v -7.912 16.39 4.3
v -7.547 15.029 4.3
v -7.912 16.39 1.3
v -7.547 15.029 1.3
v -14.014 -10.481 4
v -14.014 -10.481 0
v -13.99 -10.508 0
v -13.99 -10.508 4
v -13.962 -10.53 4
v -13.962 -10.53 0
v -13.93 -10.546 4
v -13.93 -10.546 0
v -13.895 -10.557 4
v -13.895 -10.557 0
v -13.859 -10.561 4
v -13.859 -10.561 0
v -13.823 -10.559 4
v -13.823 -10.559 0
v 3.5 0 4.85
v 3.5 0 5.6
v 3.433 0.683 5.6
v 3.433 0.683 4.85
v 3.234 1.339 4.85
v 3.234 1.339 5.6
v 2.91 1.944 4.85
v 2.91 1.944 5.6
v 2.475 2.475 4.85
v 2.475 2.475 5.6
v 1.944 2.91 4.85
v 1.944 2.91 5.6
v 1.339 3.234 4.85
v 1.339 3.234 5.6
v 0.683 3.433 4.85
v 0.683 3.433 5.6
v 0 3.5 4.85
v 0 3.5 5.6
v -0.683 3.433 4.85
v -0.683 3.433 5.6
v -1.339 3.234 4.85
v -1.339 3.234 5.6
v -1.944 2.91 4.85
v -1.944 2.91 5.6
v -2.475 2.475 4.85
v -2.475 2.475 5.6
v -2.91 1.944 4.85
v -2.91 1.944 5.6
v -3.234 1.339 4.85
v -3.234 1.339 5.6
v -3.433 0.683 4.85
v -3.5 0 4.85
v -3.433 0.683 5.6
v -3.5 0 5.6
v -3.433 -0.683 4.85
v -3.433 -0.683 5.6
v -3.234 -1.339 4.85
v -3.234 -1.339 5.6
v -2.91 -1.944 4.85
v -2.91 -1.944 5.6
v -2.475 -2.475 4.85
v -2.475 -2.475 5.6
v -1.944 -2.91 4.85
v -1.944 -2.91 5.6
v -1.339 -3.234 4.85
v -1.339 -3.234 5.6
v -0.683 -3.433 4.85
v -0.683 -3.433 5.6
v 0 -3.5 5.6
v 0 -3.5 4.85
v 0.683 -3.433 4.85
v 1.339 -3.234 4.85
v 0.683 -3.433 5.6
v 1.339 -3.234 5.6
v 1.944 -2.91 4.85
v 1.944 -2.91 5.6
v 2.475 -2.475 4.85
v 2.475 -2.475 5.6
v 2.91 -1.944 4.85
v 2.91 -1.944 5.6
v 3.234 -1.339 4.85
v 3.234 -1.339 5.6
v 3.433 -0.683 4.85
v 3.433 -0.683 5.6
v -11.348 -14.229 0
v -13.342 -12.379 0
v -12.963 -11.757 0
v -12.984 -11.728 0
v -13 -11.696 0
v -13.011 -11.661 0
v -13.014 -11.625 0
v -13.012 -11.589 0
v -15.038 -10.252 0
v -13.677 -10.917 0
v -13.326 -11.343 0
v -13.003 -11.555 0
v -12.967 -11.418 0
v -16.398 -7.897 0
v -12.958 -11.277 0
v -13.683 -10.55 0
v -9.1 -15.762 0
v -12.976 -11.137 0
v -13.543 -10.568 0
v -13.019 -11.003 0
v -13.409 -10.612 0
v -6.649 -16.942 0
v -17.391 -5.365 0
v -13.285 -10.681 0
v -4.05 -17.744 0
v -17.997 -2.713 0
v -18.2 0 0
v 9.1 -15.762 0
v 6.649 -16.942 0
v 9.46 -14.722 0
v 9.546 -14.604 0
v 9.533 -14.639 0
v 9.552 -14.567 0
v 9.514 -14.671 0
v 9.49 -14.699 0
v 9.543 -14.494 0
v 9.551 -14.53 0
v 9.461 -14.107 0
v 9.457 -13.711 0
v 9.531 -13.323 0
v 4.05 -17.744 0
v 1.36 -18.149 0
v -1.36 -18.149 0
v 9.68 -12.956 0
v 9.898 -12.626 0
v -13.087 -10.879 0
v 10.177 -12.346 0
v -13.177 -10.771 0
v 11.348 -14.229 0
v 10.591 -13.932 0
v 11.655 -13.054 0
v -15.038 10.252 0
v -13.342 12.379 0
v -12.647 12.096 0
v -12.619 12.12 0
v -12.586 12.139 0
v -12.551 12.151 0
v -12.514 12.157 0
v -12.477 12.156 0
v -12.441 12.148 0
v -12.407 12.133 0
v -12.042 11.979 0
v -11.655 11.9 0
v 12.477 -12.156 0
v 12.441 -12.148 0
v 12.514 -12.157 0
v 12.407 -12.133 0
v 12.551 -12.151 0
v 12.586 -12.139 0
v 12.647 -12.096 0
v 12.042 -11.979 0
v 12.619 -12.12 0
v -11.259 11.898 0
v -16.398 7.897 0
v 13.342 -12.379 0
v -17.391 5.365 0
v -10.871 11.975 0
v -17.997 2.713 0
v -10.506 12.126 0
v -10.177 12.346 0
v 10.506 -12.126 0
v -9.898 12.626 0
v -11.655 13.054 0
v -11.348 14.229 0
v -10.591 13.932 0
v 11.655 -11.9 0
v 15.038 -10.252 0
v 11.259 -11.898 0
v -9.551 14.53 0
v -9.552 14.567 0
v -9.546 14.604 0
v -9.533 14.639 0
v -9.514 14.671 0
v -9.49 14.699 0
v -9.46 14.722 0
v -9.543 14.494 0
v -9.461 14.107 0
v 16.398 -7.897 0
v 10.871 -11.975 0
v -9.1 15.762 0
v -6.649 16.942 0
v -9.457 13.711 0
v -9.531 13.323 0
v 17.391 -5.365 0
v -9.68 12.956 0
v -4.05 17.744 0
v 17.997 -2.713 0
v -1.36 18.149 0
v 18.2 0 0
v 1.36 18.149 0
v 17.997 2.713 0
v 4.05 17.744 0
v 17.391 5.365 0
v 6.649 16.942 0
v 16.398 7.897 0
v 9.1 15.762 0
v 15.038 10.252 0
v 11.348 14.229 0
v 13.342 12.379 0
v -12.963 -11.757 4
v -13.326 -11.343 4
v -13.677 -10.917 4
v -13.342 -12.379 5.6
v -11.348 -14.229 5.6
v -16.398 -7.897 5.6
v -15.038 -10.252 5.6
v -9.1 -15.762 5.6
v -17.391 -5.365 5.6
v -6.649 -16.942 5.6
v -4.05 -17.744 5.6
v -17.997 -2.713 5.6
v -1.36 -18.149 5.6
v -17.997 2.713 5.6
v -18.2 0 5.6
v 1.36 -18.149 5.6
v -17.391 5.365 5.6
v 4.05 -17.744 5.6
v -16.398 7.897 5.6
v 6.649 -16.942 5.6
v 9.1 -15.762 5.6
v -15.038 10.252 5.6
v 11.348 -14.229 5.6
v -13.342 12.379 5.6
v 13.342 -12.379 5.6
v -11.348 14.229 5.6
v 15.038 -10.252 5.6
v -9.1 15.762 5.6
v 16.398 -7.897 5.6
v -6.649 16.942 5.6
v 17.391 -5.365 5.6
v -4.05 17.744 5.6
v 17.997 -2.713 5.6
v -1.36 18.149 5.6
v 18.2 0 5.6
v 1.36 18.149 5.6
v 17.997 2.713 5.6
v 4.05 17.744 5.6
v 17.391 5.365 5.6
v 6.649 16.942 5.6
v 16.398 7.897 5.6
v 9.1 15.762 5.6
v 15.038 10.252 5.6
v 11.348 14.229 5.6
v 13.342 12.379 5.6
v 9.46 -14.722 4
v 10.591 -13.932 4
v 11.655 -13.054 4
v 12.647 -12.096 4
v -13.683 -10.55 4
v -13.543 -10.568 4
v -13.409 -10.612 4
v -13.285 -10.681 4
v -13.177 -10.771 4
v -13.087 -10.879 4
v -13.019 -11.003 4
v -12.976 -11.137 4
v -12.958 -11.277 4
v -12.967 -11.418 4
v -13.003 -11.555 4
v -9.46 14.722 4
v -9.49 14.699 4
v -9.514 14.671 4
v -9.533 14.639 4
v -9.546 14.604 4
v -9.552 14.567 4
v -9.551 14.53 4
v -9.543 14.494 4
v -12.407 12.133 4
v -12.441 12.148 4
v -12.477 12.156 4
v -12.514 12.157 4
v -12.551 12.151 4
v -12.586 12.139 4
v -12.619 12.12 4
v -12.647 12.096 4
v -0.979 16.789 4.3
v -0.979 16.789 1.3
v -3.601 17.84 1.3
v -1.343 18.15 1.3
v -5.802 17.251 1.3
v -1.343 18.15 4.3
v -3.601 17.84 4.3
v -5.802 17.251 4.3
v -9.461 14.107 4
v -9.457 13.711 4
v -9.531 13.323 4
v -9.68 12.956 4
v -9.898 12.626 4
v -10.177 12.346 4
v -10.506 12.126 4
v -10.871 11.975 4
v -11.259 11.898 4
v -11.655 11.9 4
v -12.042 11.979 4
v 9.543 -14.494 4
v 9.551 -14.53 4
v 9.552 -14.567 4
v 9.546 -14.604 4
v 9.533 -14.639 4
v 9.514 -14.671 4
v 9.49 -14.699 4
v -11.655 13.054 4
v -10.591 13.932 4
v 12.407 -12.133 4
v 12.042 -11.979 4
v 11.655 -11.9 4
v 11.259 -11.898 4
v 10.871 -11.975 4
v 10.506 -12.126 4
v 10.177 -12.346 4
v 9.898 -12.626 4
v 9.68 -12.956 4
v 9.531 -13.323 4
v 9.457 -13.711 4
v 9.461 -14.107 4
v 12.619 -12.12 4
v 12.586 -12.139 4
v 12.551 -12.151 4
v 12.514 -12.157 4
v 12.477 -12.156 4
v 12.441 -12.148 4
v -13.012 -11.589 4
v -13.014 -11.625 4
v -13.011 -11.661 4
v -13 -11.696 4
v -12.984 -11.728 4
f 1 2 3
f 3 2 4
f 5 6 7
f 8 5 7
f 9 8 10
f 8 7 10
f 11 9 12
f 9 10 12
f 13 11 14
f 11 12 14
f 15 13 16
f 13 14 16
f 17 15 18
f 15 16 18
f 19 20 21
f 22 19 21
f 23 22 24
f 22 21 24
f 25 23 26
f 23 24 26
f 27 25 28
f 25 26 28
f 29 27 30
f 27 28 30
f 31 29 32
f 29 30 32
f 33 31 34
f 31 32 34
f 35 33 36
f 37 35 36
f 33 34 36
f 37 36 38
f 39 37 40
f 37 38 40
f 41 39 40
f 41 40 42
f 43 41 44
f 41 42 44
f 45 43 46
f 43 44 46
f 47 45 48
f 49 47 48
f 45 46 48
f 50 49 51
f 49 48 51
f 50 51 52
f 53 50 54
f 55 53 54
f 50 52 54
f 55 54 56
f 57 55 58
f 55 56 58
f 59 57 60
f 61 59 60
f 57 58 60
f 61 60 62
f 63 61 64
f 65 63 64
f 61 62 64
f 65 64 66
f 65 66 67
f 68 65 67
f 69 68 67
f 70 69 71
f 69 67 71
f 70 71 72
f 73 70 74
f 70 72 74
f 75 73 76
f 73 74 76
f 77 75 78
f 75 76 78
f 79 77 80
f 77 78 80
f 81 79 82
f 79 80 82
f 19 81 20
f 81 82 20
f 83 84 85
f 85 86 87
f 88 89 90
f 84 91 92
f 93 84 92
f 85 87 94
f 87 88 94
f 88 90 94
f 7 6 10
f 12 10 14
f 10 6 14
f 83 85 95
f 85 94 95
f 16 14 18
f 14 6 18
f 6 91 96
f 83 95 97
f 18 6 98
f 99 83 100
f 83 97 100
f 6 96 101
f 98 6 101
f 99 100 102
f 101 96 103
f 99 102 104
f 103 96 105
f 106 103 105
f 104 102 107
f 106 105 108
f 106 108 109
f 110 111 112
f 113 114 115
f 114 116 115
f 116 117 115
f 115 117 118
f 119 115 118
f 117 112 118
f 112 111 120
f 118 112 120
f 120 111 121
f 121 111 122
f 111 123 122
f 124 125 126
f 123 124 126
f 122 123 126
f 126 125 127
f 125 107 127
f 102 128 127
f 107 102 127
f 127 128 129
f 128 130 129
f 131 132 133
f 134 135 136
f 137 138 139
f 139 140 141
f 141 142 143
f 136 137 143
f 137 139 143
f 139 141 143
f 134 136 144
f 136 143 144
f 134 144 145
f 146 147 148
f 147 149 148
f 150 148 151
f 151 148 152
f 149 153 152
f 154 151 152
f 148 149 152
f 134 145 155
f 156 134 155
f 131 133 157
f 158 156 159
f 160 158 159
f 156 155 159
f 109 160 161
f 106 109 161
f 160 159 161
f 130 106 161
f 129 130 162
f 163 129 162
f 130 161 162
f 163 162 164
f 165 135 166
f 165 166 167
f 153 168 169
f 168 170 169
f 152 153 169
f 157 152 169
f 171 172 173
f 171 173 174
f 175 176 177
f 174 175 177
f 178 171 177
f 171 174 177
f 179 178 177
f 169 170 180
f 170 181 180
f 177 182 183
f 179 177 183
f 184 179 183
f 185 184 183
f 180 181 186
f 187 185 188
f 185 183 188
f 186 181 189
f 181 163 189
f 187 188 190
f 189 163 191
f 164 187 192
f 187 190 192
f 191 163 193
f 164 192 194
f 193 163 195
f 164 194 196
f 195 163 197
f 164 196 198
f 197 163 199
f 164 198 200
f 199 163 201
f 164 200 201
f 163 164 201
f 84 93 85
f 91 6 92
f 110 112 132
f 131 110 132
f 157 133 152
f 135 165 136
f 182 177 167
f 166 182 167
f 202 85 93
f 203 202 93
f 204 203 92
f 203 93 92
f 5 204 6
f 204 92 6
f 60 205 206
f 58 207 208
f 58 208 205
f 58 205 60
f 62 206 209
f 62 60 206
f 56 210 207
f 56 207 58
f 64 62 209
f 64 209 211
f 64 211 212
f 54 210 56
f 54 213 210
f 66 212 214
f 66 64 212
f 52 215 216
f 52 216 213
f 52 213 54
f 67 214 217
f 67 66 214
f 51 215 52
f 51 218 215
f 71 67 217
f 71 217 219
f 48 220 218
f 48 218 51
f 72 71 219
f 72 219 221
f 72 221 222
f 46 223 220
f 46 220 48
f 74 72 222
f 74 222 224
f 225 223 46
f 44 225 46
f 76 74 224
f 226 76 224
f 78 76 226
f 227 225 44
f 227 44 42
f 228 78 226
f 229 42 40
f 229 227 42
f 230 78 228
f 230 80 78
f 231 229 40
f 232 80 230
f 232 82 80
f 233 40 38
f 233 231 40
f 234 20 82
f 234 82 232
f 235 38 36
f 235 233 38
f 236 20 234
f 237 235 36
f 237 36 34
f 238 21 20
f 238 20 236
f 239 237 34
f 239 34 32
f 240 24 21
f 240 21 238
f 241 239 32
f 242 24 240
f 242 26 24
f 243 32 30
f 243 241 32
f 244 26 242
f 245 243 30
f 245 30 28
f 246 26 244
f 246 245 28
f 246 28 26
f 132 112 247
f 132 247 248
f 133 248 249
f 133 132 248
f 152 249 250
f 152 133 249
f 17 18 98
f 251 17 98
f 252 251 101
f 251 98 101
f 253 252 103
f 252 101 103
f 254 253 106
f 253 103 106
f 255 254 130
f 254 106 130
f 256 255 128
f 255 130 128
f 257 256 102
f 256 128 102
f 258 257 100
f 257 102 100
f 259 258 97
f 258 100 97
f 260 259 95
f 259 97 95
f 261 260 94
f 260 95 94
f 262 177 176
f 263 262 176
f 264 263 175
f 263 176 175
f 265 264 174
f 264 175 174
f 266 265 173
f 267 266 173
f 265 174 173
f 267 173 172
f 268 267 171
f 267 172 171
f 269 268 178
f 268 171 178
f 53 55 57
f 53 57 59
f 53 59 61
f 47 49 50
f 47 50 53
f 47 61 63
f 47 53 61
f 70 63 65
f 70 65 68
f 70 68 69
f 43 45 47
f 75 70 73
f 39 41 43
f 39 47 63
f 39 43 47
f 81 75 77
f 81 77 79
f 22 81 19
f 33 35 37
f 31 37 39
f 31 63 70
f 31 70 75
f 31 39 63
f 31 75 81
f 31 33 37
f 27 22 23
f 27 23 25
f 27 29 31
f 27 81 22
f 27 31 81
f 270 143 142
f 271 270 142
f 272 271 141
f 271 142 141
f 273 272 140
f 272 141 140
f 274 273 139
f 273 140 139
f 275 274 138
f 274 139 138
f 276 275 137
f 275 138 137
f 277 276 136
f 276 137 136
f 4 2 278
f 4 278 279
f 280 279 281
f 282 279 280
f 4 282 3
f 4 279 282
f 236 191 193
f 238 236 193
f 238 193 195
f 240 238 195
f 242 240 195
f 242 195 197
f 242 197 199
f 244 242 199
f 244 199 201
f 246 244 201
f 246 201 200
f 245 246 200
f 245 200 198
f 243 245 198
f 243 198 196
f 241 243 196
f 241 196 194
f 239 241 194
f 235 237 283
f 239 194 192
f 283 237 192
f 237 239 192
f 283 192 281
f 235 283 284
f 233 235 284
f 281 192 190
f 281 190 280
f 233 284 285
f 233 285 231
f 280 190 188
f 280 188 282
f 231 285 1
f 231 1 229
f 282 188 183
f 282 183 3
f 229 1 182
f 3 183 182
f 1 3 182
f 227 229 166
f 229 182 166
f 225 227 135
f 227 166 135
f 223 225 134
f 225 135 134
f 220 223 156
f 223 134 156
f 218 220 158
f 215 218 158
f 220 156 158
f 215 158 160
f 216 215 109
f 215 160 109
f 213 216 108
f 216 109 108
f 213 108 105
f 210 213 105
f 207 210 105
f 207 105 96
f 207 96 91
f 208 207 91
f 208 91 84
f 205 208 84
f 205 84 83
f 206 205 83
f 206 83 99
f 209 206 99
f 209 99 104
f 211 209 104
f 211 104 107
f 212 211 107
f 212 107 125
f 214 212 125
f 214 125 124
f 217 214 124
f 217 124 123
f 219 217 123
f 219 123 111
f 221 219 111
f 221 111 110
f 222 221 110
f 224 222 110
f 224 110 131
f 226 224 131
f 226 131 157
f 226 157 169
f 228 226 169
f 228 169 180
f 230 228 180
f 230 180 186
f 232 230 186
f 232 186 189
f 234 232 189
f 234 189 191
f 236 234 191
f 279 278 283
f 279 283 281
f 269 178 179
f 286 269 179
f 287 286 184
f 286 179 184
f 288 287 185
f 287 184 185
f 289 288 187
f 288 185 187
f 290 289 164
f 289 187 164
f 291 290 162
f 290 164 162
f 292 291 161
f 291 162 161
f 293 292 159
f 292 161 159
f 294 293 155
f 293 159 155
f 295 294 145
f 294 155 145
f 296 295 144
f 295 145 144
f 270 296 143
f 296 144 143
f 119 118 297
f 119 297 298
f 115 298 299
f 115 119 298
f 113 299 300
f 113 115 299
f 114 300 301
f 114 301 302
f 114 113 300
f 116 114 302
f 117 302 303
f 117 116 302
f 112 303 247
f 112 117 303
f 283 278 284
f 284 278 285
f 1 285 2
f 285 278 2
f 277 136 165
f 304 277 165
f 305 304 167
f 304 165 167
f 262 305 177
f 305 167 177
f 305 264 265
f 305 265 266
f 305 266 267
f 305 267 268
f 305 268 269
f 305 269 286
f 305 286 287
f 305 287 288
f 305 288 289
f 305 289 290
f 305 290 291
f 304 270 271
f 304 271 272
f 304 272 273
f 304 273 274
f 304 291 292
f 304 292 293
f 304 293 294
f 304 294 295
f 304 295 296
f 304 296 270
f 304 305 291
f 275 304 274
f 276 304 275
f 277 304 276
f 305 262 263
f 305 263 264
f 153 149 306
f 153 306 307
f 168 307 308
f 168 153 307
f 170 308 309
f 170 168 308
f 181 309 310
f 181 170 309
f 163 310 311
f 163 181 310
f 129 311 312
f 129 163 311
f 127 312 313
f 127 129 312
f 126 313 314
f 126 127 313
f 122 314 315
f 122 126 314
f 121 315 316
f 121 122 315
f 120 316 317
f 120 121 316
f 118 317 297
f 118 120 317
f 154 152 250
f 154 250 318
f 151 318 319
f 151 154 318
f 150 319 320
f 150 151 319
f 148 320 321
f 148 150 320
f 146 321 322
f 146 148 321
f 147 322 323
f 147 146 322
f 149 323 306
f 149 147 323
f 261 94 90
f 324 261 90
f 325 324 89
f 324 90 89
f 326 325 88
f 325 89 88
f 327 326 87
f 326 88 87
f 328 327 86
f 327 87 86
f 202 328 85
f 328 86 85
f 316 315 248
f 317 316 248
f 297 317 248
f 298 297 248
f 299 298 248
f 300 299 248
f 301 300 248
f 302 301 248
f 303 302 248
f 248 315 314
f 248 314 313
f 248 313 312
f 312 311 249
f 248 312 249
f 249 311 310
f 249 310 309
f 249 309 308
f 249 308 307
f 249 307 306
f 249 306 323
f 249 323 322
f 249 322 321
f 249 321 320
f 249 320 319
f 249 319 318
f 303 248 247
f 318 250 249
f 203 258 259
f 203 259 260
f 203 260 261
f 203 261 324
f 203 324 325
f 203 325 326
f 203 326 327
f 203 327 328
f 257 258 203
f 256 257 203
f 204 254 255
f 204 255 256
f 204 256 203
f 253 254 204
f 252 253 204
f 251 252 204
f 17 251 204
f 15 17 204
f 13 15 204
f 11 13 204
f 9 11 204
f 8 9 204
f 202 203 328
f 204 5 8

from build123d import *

# Parameters (mm, degrees)
SKETCH1_R               = 18.2
BOSS_EXTRUDE1_DEPTH     = 5.6
CUT_EXTRUDE1_DEPTH      = 4
SKETCH3_R               = 3.5
CUT_EXTRUDE2_DEPTH      = 0.75
CUT_EXTRUDE3_REACH      = 44.811
CUT_EXTRUDE3_END_RADIUS = 18.2
CUT_EXTRUDE3_START      = 16.47
SKETCH5_W               = 3
SKETCH5_H               = 6.8


with BuildPart() as part:
    # Sketch1 → Boss-Extrude1 (new body)
    with BuildSketch(Plane.XY):
        Circle(SKETCH1_R)
    extrude(amount=BOSS_EXTRUDE1_DEPTH)

    # Sketch2 → Cut-Extrude1 (cut)
    with BuildSketch(Plane(origin=(0, 0, 0), x_dir=(-1, 0, 0), z_dir=(0, 0, -1))):
        with BuildLine():
            ThreePointArc((12.962542311, -11.756806404), (13.503430209, -11.131368855), (14.014170433, -10.481079481))
            ThreePointArc((14.014170433, -10.481079481), (13.929523254, -10.546491611), (13.823271504, -10.558919696))
            ThreePointArc((13.823271504, -10.558919696), (13.129289386, -10.822950961), (13.00252715, -11.554562213))
            ThreePointArc((13.00252715, -11.554562213), (13.010601193, -11.661233209), (12.962542311, -11.756806404))
        make_face()
        with BuildLine():
            ThreePointArc((-12.406576366, -12.133139552), (-10.177222153, -12.345957703), (-9.542933233, -14.493744783))
            ThreePointArc((-9.542933233, -14.493744783), (-9.540416363, -14.622080688), (-9.460407641, -14.722455205))
            ThreePointArc((-9.460407641, -14.722455205), (-11.131368855, -13.503430209), (-12.646831358, -12.095770194))
            ThreePointArc((-12.646831358, -12.095770194), (-12.53303462, -12.155156569), (-12.406576366, -12.133139552))
        make_face()
        with BuildLine():
            ThreePointArc((12.406576366, 12.133139552), (12.53303462, 12.155156569), (12.646831358, 12.095770194))
            ThreePointArc((12.646831358, 12.095770194), (11.131368855, 13.503430209), (9.460407641, 14.722455205))
            ThreePointArc((9.460407641, 14.722455205), (9.540416363, 14.622080688), (9.542933233, 14.493744783))
            ThreePointArc((9.542933233, 14.493744783), (10.177222153, 12.345957703), (12.406576366, 12.133139552))
        make_face()
    extrude(amount=-CUT_EXTRUDE1_DEPTH, mode=Mode.SUBTRACT)

    # Sketch3 → Cut-Extrude2 (cut)
    with BuildSketch(Plane.XY.offset(5.6)):
        Circle(SKETCH3_R)
    extrude(amount=-CUT_EXTRUDE2_DEPTH, mode=Mode.SUBTRACT)

    # Cut-Extrude3: up to this cylinder (the profile starts inside it)
    cut_extrude3_end = Plane(origin=(0, 0, 2.8), z_dir=(0, 0, -1)) * Cylinder(CUT_EXTRUDE3_END_RADIUS, 127.022, mode=Mode.PRIVATE)
    # Sketch5 → Cut-Extrude3 (cut, up to the surface)
    with BuildSketch(Plane(origin=(0, 0, 0), x_dir=(0, 0, -1), z_dir=(-0.25881904510252135, 0.9659258262890681, 0)).offset(CUT_EXTRUDE3_START), mode=Mode.PRIVATE) as cut_extrude3_sk1:
        with Locations((-2.8, 0)):
            Rectangle(SKETCH5_W, SKETCH5_H)
    cut_extrude3_tool1 = extrude(cut_extrude3_sk1.sketch, amount=CUT_EXTRUDE3_REACH, mode=Mode.PRIVATE) & cut_extrude3_end
    add(cut_extrude3_tool1.solids().sort_by_distance((-4.26275, 15.908798, 2.8))[0], mode=Mode.SUBTRACT)


solid = part.part
